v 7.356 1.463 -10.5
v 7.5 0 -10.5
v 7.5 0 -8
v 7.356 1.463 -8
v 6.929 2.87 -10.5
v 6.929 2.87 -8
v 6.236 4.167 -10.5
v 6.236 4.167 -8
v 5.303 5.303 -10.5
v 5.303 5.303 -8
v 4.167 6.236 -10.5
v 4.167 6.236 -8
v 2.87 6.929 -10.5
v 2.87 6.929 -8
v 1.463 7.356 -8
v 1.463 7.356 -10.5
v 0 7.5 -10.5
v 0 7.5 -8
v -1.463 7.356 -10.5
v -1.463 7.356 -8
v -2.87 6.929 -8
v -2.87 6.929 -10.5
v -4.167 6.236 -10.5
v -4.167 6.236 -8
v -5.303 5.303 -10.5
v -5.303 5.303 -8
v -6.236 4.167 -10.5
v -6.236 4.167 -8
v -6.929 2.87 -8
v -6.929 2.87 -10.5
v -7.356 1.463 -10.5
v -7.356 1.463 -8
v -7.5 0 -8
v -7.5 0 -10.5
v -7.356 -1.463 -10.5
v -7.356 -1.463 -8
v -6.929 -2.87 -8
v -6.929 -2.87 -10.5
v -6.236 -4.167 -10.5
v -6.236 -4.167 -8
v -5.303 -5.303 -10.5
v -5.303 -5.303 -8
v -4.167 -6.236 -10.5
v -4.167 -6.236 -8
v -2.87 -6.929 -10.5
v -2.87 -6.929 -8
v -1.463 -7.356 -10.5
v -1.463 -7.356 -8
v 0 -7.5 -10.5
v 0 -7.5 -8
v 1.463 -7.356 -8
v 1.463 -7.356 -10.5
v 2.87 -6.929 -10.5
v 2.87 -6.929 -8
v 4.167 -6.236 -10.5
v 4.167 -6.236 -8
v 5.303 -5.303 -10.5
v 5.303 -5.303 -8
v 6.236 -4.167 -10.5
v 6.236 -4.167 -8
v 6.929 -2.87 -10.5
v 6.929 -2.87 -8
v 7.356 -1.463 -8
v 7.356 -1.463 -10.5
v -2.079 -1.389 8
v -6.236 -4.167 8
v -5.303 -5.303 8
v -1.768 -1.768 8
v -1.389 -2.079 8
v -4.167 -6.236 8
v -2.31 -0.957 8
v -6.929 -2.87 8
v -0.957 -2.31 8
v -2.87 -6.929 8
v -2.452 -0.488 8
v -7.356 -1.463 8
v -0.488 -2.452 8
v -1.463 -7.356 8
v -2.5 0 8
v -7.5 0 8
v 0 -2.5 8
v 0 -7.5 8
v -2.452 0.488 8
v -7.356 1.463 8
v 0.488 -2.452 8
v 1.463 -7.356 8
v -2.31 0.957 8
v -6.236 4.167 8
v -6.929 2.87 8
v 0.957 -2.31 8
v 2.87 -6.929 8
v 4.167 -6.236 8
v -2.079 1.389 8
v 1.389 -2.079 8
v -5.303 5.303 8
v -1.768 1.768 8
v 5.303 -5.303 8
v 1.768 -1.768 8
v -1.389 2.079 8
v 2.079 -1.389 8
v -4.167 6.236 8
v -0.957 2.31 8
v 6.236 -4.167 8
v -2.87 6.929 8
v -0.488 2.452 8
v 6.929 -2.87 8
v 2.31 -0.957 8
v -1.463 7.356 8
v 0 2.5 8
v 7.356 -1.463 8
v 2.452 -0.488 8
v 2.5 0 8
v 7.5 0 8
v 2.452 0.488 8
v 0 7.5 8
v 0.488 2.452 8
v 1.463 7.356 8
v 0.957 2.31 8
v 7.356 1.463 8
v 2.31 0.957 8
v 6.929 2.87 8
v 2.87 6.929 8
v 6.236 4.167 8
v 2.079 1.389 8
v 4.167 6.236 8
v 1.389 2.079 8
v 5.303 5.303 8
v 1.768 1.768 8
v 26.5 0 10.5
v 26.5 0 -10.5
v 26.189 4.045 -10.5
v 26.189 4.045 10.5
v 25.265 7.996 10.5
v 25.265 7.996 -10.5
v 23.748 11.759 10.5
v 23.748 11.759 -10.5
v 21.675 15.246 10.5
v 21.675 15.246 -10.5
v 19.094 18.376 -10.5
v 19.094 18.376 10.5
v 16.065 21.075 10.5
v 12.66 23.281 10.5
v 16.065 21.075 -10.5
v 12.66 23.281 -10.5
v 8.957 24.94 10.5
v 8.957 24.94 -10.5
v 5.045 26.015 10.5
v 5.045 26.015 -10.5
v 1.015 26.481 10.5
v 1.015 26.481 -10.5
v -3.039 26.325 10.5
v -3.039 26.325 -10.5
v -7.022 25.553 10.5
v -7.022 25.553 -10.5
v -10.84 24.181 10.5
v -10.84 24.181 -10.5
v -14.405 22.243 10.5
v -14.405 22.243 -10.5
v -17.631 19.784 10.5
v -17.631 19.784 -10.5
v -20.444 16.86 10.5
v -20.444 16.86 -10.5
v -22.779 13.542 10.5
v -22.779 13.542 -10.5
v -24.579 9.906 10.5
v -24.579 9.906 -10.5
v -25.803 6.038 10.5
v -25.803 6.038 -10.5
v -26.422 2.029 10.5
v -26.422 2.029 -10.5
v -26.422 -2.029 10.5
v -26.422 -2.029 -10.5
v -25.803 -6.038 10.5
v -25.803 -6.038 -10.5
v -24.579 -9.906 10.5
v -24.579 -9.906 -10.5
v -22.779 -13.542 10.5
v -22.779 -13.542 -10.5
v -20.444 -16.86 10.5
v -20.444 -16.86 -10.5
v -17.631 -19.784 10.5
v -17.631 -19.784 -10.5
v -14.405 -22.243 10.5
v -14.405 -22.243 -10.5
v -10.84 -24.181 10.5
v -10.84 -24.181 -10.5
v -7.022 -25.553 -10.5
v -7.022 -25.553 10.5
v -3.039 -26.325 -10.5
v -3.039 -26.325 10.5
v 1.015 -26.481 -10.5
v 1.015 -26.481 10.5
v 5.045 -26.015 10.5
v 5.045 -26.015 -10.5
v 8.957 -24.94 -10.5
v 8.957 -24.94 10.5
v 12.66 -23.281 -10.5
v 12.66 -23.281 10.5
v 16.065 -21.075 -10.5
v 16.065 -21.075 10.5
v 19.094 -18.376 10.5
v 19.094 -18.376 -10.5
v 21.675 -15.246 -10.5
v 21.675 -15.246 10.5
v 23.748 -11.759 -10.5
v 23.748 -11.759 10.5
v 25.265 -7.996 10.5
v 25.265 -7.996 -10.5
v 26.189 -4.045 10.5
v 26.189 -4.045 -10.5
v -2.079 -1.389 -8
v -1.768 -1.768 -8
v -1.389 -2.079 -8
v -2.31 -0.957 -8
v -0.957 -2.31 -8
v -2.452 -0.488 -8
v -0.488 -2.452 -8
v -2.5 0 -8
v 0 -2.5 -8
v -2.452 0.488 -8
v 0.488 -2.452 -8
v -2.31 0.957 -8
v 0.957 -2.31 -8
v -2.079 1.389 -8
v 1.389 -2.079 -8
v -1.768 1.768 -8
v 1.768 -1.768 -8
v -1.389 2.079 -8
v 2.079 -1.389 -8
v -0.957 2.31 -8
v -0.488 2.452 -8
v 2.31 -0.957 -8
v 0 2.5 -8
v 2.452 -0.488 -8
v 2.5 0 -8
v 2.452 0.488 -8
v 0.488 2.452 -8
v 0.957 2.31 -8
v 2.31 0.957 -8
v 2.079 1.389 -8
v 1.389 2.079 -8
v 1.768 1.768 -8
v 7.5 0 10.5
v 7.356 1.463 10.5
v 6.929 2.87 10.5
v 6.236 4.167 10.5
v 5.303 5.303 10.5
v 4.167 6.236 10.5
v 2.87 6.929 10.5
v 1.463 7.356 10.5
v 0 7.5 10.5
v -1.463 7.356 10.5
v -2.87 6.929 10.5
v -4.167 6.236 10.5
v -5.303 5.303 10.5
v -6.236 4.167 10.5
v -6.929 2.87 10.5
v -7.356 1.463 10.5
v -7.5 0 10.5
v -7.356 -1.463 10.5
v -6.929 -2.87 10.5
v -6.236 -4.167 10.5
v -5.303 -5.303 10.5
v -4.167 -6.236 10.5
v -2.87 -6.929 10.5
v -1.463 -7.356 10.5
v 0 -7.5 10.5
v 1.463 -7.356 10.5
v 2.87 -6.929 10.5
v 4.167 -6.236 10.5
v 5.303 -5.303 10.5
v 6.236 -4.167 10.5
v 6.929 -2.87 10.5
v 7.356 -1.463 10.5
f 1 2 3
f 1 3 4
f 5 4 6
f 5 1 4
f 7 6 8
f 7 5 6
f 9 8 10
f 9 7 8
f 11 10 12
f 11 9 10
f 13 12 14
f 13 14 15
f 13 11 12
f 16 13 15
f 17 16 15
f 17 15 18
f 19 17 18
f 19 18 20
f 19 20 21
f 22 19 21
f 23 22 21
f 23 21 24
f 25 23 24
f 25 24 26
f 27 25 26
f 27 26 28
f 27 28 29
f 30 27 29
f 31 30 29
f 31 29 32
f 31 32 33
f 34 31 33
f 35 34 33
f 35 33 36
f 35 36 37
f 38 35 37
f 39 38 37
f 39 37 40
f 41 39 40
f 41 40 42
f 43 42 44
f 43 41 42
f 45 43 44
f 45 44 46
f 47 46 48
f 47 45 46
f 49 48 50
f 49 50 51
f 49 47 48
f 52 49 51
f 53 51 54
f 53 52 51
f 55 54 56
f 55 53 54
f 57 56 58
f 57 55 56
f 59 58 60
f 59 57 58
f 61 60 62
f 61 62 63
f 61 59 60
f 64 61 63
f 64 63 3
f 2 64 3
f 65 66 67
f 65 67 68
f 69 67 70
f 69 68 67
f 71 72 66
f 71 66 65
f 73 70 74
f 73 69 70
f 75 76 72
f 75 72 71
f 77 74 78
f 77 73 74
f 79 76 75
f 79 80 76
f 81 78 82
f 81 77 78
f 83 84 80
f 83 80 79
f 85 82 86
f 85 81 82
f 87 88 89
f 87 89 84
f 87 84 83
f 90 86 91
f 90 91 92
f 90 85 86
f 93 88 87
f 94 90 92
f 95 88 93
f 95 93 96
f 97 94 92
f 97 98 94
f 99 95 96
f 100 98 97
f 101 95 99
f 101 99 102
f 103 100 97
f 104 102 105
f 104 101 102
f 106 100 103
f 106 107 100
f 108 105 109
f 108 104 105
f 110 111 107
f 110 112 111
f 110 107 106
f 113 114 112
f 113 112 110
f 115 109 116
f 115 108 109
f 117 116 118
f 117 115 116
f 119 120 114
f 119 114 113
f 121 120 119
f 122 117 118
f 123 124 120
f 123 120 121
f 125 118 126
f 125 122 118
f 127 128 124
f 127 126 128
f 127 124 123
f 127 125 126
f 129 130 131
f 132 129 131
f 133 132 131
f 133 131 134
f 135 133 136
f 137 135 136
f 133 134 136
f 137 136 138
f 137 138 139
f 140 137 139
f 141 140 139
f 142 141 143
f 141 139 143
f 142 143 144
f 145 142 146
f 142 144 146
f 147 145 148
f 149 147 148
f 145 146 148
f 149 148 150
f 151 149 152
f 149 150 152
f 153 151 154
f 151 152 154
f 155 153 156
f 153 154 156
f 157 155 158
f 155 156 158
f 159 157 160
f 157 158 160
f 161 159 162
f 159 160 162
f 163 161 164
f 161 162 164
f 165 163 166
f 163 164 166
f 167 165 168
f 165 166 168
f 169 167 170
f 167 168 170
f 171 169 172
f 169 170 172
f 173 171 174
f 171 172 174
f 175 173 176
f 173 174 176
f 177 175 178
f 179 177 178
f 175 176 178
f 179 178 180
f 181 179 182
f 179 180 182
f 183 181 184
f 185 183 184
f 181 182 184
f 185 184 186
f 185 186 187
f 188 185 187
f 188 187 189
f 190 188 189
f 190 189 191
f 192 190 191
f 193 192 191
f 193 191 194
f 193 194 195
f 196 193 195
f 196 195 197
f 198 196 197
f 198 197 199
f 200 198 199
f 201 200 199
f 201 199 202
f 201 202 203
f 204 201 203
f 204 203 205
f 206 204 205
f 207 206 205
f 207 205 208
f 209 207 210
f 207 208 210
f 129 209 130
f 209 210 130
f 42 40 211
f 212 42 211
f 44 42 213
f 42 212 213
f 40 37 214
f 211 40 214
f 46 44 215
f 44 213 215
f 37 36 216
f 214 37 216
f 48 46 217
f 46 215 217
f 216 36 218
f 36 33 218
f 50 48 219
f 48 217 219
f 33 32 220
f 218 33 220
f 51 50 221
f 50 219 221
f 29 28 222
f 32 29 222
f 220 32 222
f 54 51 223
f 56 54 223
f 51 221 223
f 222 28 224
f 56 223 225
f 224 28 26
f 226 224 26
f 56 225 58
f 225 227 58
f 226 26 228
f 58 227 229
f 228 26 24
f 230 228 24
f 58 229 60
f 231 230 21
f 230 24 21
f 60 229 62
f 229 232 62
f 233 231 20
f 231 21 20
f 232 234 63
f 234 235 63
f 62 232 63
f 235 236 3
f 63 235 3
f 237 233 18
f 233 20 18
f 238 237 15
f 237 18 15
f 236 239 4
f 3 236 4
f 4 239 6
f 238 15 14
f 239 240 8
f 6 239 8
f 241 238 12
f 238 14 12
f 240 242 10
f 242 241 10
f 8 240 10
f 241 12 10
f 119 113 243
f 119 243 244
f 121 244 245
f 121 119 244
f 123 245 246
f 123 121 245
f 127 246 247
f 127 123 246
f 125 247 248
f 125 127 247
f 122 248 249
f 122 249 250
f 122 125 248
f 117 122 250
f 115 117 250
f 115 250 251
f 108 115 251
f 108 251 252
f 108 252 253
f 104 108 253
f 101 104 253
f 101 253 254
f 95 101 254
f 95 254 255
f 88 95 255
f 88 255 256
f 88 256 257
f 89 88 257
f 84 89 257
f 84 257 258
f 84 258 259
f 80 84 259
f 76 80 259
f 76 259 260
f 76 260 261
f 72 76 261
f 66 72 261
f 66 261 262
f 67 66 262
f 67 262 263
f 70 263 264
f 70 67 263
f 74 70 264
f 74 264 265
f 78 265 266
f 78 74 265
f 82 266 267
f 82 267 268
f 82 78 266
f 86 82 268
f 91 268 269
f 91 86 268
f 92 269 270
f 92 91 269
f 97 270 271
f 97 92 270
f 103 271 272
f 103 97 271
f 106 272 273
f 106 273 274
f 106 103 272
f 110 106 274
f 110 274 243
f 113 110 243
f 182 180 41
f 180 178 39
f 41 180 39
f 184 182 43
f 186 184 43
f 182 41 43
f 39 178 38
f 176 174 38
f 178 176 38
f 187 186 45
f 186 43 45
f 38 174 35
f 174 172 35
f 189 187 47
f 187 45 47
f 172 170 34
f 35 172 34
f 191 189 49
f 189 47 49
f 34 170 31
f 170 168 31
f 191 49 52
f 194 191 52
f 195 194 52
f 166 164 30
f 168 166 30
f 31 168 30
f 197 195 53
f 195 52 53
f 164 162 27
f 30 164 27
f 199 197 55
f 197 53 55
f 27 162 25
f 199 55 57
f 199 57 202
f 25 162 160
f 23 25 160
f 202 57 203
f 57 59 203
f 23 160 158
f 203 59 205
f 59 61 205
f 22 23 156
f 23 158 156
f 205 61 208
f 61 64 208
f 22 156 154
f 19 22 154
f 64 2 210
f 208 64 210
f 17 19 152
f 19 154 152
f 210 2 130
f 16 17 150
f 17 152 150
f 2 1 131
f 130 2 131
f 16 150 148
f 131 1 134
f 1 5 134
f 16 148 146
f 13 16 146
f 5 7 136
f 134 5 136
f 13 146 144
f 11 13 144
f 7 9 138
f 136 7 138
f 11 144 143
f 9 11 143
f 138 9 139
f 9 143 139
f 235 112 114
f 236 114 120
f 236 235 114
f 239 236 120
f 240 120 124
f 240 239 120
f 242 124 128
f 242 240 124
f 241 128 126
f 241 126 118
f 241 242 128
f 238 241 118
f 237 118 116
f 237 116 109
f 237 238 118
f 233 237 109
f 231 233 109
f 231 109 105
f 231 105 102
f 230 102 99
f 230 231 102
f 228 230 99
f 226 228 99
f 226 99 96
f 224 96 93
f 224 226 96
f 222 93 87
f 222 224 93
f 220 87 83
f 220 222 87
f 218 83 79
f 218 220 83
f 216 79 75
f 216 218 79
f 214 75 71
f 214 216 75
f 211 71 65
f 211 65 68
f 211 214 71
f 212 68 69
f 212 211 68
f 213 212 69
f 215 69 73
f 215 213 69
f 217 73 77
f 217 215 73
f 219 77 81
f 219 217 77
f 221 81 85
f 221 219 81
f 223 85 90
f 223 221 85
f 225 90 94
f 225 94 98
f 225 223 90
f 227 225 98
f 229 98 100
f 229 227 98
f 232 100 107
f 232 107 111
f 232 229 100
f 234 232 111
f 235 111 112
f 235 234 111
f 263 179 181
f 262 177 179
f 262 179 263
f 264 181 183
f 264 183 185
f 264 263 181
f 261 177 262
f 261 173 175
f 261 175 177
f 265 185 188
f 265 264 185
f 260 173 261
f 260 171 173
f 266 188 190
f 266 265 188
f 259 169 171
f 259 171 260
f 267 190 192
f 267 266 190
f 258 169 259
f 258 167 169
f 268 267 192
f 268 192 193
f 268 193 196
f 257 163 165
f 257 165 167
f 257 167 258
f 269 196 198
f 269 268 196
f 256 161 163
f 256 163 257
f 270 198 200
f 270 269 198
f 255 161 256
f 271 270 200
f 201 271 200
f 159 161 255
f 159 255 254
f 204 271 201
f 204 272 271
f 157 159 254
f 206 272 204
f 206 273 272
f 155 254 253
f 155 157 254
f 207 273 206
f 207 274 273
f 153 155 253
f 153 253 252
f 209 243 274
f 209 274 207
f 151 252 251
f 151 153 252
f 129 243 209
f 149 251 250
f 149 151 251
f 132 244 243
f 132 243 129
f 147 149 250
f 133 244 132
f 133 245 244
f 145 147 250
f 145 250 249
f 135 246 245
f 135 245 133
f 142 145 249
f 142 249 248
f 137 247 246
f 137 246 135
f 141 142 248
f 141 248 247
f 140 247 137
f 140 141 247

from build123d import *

# Parameters (mm, degrees)
BOSS_EXTRUDE1_DEPTH      = 10.5
BOSS_EXTRUDE1_DEPTH_BACK = 10.5
SKETCH1_R                = 26.5
SKETCH1_R_2              = 7.5
BOSS_EXTRUDE2_DEPTH      = 8
BOSS_EXTRUDE2_DEPTH_BACK = 8
SKETCH3_R                = 7.5
SKETCH3_R_2              = 2.5


with BuildPart() as part:
    # Sketch1 → Boss-Extrude1 (new, two sides: drawn at the far end of the back side and taken through both)
    with BuildSketch(Plane.XY.offset(-BOSS_EXTRUDE1_DEPTH_BACK)):
        Circle(SKETCH1_R)
        Circle(SKETCH1_R_2, mode=Mode.SUBTRACT)
    extrude(amount=BOSS_EXTRUDE1_DEPTH + BOSS_EXTRUDE1_DEPTH_BACK)

    # Sketch3 → Boss-Extrude2 (add, two sides: drawn at the far end of the back side and taken through both)
    with BuildSketch(Plane.XY.offset(-BOSS_EXTRUDE2_DEPTH_BACK)):
        Circle(SKETCH3_R)
        Circle(SKETCH3_R_2, mode=Mode.SUBTRACT)
    extrude(amount=BOSS_EXTRUDE2_DEPTH + BOSS_EXTRUDE2_DEPTH_BACK)


solid = part.part
